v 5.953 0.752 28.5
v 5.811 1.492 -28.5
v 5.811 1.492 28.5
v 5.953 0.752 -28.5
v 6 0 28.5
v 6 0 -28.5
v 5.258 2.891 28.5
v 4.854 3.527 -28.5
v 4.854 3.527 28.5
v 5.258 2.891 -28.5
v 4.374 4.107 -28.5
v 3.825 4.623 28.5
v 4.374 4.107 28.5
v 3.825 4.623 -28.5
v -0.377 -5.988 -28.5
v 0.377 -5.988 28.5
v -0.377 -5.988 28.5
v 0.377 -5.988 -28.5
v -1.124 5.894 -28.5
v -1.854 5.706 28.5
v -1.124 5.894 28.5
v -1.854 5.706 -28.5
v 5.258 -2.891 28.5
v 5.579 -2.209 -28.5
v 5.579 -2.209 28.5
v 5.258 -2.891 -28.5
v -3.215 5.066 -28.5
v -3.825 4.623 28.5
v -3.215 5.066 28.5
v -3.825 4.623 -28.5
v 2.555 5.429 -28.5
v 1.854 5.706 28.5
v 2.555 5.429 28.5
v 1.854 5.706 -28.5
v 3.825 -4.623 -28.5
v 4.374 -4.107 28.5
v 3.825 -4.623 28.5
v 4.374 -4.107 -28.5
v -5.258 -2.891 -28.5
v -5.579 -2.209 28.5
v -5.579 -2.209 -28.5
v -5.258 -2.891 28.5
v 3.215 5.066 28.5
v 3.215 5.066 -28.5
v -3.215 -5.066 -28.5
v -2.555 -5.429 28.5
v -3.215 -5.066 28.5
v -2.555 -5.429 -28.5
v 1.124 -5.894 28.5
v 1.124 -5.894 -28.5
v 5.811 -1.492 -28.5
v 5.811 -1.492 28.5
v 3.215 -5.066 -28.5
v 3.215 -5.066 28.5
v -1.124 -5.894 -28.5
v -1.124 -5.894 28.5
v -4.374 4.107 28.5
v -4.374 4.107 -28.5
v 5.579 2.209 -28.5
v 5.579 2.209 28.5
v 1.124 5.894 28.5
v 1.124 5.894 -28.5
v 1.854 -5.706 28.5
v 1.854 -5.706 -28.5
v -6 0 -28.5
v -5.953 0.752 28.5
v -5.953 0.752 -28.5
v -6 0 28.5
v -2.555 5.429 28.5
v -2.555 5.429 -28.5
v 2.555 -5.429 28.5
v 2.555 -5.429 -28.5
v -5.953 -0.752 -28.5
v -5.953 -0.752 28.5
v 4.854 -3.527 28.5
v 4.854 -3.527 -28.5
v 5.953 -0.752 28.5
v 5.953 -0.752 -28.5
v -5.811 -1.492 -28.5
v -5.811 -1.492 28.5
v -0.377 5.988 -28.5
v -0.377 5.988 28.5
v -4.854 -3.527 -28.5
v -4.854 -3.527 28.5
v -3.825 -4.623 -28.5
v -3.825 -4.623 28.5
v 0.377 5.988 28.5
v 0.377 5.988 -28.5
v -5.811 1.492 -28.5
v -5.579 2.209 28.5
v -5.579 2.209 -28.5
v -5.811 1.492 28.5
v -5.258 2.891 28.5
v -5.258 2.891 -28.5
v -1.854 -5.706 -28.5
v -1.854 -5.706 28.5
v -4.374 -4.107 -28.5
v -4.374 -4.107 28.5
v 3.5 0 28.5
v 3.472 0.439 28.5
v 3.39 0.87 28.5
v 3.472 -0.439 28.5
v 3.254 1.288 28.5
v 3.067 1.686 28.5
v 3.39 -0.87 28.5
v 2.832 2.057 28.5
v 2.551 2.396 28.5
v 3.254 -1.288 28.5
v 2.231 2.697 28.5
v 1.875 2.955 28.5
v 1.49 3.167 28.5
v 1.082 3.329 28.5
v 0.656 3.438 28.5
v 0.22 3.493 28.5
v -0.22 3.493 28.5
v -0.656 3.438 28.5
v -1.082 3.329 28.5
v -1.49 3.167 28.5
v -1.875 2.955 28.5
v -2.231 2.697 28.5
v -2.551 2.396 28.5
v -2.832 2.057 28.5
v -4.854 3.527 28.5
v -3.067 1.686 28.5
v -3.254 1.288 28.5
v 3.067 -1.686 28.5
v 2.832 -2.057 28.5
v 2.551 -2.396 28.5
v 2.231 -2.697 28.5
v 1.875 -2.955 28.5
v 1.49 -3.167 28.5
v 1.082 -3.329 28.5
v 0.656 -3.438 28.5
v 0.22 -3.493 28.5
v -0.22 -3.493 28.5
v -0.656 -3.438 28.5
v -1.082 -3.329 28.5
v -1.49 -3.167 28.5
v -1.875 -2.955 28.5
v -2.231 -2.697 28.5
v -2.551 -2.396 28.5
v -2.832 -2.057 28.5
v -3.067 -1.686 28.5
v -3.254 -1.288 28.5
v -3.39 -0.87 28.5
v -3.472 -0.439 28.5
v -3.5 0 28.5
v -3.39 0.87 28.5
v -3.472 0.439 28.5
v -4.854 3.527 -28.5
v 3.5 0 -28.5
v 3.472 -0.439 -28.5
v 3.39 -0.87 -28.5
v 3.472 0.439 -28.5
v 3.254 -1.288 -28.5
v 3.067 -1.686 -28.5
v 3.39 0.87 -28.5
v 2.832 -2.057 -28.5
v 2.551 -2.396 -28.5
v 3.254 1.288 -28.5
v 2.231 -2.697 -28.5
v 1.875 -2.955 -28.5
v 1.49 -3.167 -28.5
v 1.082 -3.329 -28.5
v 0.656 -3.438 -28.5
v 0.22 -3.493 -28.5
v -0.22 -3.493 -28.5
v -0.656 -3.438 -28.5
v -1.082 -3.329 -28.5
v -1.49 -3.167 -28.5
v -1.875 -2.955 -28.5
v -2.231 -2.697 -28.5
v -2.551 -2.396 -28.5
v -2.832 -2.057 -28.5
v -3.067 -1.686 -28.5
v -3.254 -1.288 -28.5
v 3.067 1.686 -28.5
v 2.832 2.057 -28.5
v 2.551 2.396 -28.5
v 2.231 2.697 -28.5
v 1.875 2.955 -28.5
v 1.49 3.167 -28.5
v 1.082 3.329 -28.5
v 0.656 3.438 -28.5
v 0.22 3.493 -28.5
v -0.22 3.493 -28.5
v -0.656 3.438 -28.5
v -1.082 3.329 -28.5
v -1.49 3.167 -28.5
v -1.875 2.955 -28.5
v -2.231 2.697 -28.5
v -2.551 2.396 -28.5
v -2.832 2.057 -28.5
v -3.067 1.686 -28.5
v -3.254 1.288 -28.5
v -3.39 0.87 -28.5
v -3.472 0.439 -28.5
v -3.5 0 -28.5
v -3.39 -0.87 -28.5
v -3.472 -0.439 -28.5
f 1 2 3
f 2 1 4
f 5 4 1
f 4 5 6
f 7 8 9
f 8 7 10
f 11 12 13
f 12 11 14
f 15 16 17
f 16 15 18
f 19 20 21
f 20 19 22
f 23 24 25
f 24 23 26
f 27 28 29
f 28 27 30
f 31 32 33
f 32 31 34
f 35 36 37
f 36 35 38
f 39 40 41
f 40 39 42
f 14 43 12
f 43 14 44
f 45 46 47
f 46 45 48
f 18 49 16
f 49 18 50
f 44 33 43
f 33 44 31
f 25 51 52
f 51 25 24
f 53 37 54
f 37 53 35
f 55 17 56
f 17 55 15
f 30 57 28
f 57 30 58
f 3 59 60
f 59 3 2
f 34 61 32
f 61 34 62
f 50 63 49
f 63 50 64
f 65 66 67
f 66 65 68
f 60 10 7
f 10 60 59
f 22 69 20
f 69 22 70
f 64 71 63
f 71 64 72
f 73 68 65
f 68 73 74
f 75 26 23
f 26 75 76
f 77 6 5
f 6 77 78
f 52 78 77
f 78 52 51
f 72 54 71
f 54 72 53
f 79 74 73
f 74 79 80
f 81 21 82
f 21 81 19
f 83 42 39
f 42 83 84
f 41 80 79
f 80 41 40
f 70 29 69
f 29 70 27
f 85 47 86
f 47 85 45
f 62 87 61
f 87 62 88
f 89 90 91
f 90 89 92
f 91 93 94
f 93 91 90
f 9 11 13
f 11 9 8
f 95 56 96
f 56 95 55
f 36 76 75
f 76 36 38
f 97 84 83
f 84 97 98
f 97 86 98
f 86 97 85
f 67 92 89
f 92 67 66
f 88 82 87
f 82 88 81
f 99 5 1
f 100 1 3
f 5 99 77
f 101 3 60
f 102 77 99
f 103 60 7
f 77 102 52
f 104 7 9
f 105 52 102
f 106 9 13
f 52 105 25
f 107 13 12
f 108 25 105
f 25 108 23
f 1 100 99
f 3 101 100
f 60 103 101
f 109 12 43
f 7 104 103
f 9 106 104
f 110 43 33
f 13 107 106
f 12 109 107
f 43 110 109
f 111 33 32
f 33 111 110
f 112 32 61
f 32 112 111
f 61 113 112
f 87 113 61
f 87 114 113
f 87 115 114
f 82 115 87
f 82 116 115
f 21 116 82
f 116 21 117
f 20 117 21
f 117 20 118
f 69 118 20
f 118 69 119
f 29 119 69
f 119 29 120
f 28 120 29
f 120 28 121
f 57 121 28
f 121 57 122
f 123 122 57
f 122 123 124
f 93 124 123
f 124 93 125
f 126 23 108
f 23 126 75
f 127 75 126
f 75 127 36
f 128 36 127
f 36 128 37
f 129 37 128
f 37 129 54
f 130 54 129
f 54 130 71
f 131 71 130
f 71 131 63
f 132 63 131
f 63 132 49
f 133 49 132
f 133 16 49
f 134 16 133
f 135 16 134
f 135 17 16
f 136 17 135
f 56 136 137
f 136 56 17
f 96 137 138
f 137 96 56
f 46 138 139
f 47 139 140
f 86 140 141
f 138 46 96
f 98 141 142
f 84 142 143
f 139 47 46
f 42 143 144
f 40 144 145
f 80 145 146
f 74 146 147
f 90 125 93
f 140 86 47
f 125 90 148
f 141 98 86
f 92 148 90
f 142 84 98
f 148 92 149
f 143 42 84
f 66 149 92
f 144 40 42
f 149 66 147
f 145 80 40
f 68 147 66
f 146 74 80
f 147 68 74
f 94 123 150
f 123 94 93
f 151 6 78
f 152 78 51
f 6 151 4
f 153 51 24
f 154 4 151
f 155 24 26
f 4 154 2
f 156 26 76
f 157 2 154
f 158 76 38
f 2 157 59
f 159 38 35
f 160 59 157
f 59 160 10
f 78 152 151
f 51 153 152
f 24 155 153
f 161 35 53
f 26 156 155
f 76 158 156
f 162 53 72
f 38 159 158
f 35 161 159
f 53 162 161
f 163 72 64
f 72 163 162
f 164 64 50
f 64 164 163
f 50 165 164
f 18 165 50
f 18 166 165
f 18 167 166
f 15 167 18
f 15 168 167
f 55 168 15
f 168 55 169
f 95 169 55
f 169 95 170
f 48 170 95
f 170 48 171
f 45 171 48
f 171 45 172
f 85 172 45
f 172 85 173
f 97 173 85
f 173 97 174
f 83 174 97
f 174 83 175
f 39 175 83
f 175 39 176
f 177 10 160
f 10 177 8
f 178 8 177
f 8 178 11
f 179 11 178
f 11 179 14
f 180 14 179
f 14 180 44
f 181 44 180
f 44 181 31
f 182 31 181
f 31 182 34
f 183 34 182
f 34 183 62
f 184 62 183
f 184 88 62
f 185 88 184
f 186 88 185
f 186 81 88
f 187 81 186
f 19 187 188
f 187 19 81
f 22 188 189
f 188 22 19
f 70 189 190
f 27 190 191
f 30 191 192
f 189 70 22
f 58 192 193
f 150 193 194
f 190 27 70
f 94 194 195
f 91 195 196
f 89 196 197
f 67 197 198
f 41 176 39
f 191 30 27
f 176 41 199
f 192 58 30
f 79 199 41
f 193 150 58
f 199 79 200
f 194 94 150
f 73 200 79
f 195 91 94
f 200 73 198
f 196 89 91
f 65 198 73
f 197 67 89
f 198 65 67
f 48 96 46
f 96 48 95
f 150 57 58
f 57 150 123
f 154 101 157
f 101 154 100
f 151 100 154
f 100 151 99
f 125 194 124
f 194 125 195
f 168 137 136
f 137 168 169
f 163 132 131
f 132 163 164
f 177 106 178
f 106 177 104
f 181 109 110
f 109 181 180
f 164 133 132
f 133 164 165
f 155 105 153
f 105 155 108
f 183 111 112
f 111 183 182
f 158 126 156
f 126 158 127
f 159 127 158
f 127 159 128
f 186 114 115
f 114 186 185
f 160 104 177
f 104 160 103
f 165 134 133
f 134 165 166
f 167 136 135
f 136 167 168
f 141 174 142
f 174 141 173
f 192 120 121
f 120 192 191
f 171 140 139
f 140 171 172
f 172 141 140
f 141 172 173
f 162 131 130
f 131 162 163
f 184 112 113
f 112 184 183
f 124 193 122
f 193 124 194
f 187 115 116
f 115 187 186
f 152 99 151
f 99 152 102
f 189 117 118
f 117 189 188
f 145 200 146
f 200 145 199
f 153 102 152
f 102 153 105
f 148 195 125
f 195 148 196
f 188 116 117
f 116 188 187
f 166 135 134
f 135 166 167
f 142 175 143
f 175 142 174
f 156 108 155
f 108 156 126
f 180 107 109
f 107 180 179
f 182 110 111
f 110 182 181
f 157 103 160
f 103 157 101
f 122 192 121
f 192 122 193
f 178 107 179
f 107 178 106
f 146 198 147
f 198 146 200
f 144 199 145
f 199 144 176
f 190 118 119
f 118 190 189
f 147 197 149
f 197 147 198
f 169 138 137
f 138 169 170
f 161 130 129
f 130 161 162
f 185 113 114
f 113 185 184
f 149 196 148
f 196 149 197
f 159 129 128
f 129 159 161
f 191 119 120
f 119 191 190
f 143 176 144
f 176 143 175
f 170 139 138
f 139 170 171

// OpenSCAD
$fn = 50;


difference() {
	union() {
		translate(v = [0, 0, -28.5000000000]) {
			cylinder(h = 57, r = 6.0000000000);
		}
	}
	union() {
		translate(v = [0, 0, -100.0000000000]) {
			cylinder(h = 200, r = 3.5000000000);
		}
	}
}
